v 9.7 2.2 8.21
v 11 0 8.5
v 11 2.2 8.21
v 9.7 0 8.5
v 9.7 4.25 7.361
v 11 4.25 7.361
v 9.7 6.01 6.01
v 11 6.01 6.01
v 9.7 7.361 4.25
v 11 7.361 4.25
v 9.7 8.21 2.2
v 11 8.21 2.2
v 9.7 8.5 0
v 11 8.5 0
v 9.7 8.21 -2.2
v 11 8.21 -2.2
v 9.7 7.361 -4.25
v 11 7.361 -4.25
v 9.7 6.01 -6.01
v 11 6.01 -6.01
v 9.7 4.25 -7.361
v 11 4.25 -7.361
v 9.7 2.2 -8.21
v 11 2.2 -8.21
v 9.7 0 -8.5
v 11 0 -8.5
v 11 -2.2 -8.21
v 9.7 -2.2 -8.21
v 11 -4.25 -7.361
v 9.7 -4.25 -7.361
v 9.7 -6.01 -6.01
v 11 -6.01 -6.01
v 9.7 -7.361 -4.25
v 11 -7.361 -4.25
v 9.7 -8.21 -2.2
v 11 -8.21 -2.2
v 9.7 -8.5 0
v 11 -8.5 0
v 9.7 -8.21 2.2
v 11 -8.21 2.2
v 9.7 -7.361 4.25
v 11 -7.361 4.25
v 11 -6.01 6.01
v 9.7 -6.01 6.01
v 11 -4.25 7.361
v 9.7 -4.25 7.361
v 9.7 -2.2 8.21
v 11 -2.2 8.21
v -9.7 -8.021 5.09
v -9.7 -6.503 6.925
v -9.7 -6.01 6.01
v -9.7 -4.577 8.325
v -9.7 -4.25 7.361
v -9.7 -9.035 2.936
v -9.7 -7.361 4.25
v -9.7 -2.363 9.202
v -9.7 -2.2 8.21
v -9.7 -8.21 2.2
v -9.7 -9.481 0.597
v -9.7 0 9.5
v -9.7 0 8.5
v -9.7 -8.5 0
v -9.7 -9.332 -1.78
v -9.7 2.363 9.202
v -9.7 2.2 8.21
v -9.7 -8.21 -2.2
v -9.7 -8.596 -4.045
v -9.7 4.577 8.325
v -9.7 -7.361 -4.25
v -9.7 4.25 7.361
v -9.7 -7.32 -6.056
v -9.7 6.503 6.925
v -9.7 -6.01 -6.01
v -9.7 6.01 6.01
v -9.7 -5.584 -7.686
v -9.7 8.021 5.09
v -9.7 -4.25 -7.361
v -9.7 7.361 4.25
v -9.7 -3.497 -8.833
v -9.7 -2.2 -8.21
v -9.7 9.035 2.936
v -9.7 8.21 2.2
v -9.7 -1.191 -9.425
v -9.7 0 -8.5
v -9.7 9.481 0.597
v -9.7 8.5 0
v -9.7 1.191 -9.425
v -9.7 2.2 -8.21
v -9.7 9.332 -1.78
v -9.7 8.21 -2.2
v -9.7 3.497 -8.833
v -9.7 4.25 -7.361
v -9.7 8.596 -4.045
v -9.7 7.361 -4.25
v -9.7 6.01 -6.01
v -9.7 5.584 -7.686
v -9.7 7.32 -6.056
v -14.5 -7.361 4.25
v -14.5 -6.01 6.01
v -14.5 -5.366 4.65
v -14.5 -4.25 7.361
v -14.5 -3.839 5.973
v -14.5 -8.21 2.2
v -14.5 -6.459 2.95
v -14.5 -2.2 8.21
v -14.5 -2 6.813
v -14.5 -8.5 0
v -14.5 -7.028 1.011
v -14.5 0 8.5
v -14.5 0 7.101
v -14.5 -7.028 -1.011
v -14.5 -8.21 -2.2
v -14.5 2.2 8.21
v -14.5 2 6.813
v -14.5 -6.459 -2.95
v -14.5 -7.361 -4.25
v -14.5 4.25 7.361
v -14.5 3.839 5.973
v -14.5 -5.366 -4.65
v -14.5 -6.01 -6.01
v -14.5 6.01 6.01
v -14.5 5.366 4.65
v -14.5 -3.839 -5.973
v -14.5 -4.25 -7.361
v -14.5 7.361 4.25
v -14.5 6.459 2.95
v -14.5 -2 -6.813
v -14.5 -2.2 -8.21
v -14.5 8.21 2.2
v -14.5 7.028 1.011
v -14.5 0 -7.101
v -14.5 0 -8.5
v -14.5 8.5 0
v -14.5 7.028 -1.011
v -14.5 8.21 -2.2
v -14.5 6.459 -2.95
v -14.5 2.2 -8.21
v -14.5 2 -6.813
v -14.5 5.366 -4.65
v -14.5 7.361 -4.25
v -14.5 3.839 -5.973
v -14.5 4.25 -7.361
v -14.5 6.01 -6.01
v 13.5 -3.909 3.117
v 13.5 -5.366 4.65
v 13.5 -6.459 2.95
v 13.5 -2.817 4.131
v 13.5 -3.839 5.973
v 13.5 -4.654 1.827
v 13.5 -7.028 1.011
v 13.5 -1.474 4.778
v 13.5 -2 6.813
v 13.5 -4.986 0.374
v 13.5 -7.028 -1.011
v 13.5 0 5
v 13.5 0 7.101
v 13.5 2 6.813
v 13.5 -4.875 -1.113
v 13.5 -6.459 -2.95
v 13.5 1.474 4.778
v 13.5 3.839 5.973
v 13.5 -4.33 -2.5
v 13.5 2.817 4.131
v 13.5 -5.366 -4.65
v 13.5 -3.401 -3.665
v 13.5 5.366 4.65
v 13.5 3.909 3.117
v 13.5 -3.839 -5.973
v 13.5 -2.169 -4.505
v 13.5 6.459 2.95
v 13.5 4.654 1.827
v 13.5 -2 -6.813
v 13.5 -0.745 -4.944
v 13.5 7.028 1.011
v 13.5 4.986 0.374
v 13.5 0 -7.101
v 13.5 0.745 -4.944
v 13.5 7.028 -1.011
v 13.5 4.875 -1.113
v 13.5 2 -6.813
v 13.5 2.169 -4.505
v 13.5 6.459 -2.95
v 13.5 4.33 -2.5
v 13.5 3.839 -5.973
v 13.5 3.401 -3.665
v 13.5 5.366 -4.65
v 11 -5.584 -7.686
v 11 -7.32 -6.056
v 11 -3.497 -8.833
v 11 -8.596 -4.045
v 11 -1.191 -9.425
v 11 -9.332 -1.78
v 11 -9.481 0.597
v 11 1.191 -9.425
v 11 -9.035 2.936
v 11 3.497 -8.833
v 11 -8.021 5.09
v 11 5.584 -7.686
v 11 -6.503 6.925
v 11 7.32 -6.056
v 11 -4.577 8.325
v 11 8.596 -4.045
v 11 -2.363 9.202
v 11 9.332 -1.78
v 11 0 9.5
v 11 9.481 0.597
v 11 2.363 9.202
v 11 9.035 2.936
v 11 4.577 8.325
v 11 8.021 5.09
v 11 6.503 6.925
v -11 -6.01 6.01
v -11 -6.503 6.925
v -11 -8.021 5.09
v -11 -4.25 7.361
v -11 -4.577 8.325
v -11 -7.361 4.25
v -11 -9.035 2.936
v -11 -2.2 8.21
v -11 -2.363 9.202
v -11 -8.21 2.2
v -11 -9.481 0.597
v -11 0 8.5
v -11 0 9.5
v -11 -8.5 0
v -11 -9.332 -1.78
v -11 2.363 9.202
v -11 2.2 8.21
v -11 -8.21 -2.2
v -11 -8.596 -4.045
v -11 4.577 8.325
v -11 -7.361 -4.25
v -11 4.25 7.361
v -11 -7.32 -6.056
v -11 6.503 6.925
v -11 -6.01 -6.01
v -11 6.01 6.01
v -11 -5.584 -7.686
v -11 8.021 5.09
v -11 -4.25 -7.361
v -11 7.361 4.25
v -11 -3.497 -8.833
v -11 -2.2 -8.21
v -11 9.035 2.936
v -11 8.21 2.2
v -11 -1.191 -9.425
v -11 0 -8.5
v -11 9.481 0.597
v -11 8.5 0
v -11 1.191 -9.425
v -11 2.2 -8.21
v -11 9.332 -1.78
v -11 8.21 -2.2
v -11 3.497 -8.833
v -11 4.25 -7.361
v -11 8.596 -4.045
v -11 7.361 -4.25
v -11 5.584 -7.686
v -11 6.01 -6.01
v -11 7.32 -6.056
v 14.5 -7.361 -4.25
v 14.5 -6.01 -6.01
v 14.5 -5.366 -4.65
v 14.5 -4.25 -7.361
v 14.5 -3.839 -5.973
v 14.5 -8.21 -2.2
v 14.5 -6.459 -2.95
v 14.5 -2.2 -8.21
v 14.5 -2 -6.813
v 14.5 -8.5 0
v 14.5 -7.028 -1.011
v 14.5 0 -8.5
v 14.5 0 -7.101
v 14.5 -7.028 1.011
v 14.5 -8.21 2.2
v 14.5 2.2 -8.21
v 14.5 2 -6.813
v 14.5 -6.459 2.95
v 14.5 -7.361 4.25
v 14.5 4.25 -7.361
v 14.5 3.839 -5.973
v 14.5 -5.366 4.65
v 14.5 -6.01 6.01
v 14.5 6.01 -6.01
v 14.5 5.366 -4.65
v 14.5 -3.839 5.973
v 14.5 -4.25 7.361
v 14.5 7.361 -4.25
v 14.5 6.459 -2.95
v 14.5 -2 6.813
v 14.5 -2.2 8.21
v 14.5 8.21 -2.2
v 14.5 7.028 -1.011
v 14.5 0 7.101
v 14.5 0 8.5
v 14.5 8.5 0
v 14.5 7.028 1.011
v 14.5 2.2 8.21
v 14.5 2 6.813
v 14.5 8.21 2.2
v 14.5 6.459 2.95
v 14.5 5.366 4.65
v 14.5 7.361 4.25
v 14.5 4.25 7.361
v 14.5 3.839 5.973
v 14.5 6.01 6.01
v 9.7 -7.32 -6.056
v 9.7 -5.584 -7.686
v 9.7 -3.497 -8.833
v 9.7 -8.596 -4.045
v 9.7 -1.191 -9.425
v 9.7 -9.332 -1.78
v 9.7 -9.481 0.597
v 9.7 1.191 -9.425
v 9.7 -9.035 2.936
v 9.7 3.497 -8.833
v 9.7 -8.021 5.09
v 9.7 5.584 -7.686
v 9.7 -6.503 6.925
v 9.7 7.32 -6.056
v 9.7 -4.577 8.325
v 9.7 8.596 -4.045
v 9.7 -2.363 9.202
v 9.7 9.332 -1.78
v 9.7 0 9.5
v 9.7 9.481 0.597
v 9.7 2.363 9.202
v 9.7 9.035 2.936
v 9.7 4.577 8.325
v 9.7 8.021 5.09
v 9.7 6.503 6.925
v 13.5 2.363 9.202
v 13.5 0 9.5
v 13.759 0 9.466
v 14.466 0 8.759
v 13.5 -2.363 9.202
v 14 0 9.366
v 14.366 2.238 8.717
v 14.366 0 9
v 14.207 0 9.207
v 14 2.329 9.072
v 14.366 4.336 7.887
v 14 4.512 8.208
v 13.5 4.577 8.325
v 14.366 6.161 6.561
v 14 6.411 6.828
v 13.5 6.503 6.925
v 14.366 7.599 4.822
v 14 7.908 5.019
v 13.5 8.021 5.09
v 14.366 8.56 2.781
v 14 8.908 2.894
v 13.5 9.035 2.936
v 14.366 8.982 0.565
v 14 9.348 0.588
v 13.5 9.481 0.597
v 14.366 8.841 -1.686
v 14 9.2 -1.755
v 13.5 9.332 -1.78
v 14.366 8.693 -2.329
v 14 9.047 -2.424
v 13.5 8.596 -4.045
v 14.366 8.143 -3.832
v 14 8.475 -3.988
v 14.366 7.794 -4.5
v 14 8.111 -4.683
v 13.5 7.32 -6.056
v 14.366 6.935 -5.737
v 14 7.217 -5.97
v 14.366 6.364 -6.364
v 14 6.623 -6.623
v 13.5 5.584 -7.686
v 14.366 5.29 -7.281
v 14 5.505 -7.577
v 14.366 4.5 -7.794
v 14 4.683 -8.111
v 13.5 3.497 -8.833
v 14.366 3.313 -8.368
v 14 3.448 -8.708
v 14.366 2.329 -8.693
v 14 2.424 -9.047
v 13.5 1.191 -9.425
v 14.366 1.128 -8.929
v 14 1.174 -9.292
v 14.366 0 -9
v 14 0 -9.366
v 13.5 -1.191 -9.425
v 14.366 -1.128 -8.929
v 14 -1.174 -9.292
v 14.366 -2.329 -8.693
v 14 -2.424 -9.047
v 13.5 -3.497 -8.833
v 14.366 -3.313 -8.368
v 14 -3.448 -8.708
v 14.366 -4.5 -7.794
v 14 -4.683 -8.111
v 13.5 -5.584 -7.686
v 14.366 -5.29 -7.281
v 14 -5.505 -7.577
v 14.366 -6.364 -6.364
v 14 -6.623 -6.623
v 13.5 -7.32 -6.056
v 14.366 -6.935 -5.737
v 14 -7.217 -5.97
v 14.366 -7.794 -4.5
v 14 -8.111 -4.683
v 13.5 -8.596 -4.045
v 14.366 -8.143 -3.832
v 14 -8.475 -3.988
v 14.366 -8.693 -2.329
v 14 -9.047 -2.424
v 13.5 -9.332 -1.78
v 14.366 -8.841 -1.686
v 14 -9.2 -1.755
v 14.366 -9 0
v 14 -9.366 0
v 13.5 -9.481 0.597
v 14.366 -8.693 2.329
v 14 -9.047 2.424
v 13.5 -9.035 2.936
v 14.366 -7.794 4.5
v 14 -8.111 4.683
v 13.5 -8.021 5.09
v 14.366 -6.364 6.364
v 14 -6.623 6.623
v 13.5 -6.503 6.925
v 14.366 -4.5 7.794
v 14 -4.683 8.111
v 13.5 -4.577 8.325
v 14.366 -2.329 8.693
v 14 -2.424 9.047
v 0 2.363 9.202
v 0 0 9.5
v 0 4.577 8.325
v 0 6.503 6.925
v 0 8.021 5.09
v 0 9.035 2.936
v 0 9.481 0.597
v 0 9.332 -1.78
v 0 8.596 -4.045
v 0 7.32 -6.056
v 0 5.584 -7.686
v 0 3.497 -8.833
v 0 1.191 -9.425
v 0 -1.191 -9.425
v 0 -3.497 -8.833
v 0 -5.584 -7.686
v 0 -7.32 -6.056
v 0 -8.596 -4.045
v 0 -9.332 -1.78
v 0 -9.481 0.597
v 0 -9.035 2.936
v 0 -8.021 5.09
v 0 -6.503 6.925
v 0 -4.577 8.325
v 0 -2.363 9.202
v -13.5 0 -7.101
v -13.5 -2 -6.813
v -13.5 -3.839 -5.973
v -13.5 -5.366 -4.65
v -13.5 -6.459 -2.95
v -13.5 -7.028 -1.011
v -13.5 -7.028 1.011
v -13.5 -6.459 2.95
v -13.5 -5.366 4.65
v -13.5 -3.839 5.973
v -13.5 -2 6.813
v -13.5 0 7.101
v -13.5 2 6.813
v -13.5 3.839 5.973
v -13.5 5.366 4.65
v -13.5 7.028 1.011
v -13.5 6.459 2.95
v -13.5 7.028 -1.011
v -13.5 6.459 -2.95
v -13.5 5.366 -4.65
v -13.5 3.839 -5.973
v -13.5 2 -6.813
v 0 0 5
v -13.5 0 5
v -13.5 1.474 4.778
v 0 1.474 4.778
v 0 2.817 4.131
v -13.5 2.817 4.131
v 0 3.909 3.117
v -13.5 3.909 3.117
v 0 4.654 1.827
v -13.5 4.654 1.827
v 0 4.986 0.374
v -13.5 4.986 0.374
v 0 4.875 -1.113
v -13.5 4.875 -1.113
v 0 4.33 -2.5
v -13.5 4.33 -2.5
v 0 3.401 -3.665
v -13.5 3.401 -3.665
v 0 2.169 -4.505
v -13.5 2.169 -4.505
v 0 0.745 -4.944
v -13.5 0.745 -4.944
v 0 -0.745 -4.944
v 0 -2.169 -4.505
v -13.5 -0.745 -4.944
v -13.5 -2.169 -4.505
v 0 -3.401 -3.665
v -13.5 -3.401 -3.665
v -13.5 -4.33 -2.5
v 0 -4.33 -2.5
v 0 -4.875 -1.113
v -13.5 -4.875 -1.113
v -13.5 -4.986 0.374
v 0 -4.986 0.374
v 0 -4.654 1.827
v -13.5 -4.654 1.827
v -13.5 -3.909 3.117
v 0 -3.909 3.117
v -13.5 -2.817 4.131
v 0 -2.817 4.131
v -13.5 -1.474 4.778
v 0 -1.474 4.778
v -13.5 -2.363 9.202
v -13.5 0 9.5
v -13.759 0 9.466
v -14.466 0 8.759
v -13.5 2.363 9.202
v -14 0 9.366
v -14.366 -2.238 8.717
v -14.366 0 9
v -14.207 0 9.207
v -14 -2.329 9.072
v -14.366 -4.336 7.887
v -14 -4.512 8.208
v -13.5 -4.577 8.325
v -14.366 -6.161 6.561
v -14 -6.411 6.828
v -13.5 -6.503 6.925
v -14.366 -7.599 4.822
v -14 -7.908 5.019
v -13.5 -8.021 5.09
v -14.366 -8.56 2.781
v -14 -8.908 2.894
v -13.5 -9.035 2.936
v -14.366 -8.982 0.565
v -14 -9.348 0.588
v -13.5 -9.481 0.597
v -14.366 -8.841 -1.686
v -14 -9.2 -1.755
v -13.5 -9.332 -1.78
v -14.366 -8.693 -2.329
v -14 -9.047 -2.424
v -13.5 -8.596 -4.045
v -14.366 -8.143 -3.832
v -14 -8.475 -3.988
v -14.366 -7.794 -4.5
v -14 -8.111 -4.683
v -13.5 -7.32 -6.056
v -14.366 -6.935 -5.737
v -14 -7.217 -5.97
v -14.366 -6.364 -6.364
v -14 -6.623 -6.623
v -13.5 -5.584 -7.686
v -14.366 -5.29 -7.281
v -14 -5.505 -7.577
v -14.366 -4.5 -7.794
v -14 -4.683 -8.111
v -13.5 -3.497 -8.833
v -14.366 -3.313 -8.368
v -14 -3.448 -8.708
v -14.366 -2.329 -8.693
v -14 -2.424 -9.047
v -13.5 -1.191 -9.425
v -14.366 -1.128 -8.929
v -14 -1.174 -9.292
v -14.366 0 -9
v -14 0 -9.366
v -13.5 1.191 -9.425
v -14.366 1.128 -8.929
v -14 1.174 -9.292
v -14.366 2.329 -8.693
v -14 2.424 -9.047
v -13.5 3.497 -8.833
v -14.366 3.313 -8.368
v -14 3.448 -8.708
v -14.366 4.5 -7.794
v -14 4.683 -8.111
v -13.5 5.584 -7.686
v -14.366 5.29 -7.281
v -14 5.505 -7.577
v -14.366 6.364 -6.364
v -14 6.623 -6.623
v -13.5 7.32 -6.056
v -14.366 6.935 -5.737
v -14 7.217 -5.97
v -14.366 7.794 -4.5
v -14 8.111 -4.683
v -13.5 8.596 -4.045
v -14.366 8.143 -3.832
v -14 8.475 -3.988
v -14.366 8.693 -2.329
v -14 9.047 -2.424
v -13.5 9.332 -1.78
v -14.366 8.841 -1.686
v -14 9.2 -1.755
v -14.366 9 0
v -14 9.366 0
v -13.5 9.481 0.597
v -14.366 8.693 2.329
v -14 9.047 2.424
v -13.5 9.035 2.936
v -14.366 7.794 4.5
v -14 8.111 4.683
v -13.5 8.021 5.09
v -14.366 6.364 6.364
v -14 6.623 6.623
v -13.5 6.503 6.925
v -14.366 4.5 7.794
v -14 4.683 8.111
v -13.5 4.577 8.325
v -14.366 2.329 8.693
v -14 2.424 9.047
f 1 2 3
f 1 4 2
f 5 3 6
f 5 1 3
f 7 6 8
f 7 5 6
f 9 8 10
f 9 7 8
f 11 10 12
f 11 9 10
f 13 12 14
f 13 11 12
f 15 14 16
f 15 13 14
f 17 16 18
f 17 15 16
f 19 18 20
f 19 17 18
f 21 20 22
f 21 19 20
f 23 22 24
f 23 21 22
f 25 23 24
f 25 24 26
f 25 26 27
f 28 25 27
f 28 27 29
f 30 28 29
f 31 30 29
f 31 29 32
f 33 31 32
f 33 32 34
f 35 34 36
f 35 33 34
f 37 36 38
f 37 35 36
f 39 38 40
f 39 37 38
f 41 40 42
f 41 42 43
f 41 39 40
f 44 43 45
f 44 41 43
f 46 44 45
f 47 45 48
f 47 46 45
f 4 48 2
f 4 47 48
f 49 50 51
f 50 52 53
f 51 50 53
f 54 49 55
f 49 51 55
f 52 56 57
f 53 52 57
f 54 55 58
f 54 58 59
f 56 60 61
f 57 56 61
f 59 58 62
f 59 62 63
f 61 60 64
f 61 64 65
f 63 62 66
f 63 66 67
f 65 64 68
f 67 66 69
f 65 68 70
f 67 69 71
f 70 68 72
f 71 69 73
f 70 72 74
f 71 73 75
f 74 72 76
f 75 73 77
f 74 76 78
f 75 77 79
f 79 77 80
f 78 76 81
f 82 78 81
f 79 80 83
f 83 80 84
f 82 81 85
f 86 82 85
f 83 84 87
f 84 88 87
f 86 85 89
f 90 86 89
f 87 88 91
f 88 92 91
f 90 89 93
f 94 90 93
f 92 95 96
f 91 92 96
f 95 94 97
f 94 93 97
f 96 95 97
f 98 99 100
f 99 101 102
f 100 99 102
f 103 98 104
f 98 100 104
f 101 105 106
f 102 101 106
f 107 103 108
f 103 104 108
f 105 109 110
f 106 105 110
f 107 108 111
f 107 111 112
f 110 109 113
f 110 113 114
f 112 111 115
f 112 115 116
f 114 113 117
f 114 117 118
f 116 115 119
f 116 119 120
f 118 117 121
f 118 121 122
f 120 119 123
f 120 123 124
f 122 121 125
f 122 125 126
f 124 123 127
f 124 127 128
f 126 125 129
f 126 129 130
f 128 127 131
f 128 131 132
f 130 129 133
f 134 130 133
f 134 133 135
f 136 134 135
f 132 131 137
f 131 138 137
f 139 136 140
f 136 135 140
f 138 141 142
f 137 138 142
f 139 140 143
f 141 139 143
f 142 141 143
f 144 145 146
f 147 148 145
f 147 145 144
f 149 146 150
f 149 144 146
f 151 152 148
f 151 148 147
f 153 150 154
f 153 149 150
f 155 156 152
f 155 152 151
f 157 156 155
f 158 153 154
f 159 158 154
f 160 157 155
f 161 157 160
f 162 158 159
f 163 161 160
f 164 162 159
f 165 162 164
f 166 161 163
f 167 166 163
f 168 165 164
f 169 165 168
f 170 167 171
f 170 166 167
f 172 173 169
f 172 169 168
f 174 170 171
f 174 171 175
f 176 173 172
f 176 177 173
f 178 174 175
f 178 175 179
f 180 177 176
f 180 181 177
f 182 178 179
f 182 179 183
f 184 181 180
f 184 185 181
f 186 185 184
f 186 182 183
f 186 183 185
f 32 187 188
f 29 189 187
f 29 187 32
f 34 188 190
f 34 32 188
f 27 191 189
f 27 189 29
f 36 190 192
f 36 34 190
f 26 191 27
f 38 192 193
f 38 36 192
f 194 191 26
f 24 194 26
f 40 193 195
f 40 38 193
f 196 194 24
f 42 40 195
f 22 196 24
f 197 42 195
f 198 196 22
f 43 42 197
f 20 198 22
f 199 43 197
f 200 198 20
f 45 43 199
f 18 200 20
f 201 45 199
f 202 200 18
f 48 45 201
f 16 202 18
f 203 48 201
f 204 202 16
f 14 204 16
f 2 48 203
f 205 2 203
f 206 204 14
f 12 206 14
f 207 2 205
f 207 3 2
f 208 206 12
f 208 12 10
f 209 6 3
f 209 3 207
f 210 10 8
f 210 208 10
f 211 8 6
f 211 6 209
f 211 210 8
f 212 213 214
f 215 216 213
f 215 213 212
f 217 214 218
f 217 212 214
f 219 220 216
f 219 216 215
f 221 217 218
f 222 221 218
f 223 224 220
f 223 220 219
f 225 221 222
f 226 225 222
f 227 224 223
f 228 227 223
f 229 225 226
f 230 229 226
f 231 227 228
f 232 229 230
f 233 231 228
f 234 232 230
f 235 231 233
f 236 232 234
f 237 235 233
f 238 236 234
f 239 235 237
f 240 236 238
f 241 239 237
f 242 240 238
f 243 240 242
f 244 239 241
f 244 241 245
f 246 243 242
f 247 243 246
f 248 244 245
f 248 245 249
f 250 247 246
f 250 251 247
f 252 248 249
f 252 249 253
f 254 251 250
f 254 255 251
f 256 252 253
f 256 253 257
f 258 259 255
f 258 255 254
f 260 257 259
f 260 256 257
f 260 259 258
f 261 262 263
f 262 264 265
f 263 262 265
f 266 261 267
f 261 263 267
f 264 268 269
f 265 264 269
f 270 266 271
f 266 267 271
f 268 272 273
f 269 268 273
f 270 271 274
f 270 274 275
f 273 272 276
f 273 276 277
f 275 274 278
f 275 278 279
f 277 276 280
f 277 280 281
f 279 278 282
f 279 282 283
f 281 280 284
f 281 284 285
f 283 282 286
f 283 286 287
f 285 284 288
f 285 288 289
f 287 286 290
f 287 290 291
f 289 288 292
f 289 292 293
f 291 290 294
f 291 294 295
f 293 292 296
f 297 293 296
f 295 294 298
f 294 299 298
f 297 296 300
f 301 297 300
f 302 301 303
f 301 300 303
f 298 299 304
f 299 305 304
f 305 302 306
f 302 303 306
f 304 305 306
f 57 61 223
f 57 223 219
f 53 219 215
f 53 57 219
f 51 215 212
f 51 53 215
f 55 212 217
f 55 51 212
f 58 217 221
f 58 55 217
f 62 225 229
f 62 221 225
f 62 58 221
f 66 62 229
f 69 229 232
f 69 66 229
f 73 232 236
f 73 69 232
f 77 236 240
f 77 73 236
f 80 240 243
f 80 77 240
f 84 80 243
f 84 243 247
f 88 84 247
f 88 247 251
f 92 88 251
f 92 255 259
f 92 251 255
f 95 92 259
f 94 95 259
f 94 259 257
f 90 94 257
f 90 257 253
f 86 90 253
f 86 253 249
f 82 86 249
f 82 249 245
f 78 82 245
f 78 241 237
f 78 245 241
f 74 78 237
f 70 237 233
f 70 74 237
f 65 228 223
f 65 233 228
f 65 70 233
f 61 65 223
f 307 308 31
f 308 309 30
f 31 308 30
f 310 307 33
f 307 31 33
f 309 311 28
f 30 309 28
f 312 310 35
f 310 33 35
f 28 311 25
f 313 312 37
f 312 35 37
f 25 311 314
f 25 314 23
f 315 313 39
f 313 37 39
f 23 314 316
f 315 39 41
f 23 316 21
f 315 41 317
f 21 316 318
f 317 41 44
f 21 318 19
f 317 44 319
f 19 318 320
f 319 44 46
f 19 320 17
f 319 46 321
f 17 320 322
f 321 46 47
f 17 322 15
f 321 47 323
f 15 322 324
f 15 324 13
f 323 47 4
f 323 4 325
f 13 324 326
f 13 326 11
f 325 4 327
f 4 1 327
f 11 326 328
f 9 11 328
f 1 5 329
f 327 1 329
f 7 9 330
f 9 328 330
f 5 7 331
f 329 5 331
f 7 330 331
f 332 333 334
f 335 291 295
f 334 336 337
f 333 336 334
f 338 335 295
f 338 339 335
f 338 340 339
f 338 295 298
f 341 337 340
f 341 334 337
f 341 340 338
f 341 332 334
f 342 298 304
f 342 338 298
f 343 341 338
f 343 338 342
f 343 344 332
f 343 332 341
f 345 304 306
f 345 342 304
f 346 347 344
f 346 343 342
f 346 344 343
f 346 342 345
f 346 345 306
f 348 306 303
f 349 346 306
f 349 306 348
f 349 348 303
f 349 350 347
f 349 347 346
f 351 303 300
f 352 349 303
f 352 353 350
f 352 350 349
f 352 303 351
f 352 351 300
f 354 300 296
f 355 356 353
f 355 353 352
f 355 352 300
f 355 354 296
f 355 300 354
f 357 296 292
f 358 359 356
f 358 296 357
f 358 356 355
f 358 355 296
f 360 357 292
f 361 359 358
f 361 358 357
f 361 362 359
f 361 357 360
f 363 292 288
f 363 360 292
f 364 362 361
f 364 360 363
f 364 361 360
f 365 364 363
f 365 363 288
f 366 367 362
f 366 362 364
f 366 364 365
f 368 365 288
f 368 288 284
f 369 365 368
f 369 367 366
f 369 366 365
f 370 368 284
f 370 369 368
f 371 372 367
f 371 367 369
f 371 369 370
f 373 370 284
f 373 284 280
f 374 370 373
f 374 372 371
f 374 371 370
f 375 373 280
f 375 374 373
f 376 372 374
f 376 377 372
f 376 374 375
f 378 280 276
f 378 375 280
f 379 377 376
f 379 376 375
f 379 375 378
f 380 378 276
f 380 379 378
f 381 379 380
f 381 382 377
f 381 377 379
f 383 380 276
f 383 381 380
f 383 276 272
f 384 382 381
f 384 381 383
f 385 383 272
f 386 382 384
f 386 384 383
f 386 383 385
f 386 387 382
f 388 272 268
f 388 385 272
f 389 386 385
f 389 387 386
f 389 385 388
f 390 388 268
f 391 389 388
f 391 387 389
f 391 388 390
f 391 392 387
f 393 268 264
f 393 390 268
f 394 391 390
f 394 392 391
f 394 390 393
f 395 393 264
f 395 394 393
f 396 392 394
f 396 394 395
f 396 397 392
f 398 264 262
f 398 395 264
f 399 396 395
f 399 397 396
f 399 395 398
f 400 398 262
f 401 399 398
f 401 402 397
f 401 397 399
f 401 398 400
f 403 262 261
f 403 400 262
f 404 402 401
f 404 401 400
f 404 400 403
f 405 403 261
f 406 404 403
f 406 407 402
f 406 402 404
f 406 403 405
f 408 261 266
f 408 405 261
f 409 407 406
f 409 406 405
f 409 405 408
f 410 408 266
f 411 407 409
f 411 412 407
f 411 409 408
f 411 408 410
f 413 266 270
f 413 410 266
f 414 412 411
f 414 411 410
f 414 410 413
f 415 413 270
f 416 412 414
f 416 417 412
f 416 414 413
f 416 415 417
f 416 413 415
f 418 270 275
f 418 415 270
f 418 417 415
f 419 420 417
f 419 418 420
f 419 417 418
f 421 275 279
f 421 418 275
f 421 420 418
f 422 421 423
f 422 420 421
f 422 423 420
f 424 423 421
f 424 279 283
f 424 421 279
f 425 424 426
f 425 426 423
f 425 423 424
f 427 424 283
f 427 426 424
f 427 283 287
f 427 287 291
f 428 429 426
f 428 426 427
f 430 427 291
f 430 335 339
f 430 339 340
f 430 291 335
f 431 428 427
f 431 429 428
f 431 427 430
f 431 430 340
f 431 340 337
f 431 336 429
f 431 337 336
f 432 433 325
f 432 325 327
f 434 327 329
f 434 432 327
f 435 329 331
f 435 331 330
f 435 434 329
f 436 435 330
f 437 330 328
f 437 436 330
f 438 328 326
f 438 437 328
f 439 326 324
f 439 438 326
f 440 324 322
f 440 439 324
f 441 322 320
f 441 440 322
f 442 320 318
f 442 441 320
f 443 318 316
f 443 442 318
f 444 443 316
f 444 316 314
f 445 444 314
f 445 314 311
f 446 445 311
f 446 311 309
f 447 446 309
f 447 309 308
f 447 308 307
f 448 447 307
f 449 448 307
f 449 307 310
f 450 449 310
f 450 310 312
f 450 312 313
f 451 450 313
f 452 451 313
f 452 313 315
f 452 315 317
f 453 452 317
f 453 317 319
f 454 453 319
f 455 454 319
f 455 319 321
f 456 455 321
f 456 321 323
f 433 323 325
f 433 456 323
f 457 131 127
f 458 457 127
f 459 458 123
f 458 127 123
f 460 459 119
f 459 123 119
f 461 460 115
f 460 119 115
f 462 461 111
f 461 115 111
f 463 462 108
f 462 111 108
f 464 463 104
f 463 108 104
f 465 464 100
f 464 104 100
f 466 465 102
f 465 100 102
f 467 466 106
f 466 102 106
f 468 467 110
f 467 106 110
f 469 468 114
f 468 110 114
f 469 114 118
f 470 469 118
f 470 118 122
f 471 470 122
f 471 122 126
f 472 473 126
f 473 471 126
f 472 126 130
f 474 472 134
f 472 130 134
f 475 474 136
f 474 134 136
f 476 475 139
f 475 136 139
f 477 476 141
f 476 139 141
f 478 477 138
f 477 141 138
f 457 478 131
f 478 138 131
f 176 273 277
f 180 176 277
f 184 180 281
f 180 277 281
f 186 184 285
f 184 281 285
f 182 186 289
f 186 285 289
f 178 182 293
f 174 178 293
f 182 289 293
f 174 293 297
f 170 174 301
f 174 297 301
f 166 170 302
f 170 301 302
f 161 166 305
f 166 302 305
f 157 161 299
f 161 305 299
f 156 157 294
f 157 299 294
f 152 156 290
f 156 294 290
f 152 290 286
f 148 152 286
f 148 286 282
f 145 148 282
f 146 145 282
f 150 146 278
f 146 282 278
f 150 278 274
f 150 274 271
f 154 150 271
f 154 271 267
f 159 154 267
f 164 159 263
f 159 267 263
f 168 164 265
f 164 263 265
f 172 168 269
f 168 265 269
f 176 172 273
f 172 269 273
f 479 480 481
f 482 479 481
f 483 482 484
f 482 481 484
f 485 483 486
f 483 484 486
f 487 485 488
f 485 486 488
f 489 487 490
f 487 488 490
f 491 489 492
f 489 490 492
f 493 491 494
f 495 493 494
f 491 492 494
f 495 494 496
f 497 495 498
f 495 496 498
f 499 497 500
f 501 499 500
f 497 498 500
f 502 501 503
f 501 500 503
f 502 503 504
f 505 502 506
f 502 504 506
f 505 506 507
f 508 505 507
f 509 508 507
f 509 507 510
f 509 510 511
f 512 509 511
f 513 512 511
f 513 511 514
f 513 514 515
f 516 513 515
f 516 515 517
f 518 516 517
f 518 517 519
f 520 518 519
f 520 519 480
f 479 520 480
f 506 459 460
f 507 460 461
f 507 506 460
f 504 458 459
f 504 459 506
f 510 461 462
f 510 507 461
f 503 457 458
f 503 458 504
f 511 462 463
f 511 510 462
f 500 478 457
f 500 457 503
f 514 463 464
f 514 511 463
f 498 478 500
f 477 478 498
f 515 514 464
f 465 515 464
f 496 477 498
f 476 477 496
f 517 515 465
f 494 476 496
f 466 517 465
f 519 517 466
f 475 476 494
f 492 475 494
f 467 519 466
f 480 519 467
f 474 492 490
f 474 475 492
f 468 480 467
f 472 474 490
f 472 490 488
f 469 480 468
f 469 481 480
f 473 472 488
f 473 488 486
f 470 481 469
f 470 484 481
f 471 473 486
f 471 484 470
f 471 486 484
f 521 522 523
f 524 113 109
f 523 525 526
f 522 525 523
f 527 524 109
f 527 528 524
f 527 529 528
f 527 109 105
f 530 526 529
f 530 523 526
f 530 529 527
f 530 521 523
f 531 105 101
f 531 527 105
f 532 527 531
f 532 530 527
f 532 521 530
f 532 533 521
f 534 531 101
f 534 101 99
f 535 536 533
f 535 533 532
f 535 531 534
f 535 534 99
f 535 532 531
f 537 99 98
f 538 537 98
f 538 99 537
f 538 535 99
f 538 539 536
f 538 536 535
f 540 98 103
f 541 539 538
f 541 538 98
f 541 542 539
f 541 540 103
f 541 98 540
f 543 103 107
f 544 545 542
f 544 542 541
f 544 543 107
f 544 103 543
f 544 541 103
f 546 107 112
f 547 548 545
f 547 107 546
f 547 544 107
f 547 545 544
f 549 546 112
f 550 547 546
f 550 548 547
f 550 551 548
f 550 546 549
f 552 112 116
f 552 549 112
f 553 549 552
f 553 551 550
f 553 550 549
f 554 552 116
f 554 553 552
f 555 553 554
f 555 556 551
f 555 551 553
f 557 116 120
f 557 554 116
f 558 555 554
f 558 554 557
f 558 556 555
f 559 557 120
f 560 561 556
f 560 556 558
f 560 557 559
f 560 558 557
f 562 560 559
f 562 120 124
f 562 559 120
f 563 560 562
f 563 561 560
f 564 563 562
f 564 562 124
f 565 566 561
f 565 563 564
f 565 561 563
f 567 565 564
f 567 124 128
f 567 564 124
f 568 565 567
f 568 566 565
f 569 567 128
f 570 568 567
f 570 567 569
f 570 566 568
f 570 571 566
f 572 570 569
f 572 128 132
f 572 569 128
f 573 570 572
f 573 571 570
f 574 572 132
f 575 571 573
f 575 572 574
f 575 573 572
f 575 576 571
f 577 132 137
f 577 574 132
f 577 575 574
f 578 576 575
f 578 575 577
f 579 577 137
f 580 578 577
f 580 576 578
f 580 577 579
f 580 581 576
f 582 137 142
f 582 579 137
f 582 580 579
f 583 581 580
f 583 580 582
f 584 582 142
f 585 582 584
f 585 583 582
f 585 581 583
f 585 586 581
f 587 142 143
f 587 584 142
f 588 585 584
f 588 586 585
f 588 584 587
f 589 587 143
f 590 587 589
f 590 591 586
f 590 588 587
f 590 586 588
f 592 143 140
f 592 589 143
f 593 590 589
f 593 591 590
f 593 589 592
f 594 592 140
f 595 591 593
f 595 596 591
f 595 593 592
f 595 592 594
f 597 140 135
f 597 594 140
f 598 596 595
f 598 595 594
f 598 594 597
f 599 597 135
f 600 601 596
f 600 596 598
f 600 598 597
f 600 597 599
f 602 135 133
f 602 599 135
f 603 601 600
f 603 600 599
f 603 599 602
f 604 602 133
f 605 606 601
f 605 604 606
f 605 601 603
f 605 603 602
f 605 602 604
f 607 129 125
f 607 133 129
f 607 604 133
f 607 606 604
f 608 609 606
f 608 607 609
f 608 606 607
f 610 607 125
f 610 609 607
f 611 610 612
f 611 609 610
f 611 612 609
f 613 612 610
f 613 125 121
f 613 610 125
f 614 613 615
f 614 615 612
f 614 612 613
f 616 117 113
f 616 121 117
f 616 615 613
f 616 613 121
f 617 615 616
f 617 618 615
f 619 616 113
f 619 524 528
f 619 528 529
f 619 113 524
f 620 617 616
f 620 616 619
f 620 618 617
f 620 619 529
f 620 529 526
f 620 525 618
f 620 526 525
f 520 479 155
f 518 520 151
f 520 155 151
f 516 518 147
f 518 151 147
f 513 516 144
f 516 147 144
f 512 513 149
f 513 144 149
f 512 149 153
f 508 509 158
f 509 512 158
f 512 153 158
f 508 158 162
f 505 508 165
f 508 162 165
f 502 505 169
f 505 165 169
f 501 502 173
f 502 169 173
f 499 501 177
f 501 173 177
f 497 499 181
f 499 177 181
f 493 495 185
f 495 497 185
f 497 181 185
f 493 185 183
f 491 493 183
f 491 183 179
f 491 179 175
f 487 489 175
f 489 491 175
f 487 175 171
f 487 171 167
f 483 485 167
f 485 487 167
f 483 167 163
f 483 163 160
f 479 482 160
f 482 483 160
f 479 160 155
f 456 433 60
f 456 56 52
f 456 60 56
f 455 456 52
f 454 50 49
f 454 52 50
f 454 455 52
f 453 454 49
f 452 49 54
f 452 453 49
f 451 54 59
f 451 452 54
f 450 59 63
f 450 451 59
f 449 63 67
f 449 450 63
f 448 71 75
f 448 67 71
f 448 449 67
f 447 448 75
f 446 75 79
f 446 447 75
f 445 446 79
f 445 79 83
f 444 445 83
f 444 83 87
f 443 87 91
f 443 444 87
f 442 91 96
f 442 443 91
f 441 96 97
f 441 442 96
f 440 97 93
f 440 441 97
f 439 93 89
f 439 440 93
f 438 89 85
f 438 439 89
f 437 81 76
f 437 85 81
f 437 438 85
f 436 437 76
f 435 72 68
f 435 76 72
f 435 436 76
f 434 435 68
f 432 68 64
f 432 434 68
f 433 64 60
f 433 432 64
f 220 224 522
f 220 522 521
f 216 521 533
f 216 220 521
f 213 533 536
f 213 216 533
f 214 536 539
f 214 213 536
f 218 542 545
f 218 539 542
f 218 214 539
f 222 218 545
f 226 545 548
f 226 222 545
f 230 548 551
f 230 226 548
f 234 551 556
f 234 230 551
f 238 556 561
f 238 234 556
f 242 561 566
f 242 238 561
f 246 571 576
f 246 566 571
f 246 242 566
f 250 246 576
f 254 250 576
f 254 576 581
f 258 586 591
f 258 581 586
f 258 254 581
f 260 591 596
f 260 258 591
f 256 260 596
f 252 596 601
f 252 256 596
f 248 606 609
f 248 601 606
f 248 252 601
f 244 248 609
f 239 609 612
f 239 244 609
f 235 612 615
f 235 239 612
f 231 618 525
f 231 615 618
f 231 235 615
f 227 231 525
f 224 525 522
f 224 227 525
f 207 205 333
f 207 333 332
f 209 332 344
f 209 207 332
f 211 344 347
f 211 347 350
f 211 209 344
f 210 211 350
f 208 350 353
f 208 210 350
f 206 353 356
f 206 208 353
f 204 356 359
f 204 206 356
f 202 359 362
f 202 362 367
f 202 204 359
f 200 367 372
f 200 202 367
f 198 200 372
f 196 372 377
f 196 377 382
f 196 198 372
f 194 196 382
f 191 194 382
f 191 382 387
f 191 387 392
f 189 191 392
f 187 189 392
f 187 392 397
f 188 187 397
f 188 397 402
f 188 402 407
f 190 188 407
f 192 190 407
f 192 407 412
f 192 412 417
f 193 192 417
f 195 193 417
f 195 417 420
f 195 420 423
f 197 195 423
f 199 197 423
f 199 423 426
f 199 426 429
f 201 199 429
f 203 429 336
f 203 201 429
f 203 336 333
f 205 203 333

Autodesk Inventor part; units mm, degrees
ref_plane "YZ Plane" through (0, 0, 0) normal (1, 0, 0) x (0, 1, 0)
ref_plane "XZ Plane" through (0, 0, 0) normal (0, 1, 0) x (-1, 0, 0)
ref_plane "XY Plane" through (0, 0, 0) normal (0, 0, 1) x (1, 0, 0)
sketch "Schizzo1" plane through (0, 0, 0) normal (0, 1, 0) x (-1, 0, 0)
  line L0 (-14.5, 5) -> (-14.5, 9.5)
  line L1 (-14.5, 9.5) -> (-11, 9.5)
  line L2 (-11, 9.5) -> (-11, 8.5)
  line L3 (-11, 8.5) -> (-9.7, 8.5)
  line L4 (-9.7, 8.5) -> (-9.7, 9.5)
  line L5 (-9.7, 9.5) -> (0, 9.5)
  line L6 (0, 9.5) -> (0, 5)
  line L7 (0, 5) -> (-14.5, 5)
  line L8 (0, 0) -> (5.7518, 0)
  dimension "d0" = 10
  dimension "d2" = 19
  dimension "d3" = 14.5
  dimension "d4" = 11
  dimension "d5" = 1.3
  dimension "d6" = 17
revolve "Rivoluzione1" add sketch "Schizzo1" angle 360 about axis through (0, 0, 0) along (-1, 0, 0)
fillet "Raccordo1" radius 1 1 edges at (14.5, 0, -9.5)
sketch "Schizzo2" plane through (14.5, 0, 0) normal (1, 0, 0) x (0, 0, -1)
  circle A0 centre (0, 0) radius 8.5 projected
  circle A1 centre (0, 0) radius 7.1007
extrude "Estrusione2" cut sketch "Schizzo2" against normal blind 1 contours A1
mirror "Specchio1" about plane through (0, 0, 7.25) normal (-1, 0, 0)
properties part number "LM10UU"
